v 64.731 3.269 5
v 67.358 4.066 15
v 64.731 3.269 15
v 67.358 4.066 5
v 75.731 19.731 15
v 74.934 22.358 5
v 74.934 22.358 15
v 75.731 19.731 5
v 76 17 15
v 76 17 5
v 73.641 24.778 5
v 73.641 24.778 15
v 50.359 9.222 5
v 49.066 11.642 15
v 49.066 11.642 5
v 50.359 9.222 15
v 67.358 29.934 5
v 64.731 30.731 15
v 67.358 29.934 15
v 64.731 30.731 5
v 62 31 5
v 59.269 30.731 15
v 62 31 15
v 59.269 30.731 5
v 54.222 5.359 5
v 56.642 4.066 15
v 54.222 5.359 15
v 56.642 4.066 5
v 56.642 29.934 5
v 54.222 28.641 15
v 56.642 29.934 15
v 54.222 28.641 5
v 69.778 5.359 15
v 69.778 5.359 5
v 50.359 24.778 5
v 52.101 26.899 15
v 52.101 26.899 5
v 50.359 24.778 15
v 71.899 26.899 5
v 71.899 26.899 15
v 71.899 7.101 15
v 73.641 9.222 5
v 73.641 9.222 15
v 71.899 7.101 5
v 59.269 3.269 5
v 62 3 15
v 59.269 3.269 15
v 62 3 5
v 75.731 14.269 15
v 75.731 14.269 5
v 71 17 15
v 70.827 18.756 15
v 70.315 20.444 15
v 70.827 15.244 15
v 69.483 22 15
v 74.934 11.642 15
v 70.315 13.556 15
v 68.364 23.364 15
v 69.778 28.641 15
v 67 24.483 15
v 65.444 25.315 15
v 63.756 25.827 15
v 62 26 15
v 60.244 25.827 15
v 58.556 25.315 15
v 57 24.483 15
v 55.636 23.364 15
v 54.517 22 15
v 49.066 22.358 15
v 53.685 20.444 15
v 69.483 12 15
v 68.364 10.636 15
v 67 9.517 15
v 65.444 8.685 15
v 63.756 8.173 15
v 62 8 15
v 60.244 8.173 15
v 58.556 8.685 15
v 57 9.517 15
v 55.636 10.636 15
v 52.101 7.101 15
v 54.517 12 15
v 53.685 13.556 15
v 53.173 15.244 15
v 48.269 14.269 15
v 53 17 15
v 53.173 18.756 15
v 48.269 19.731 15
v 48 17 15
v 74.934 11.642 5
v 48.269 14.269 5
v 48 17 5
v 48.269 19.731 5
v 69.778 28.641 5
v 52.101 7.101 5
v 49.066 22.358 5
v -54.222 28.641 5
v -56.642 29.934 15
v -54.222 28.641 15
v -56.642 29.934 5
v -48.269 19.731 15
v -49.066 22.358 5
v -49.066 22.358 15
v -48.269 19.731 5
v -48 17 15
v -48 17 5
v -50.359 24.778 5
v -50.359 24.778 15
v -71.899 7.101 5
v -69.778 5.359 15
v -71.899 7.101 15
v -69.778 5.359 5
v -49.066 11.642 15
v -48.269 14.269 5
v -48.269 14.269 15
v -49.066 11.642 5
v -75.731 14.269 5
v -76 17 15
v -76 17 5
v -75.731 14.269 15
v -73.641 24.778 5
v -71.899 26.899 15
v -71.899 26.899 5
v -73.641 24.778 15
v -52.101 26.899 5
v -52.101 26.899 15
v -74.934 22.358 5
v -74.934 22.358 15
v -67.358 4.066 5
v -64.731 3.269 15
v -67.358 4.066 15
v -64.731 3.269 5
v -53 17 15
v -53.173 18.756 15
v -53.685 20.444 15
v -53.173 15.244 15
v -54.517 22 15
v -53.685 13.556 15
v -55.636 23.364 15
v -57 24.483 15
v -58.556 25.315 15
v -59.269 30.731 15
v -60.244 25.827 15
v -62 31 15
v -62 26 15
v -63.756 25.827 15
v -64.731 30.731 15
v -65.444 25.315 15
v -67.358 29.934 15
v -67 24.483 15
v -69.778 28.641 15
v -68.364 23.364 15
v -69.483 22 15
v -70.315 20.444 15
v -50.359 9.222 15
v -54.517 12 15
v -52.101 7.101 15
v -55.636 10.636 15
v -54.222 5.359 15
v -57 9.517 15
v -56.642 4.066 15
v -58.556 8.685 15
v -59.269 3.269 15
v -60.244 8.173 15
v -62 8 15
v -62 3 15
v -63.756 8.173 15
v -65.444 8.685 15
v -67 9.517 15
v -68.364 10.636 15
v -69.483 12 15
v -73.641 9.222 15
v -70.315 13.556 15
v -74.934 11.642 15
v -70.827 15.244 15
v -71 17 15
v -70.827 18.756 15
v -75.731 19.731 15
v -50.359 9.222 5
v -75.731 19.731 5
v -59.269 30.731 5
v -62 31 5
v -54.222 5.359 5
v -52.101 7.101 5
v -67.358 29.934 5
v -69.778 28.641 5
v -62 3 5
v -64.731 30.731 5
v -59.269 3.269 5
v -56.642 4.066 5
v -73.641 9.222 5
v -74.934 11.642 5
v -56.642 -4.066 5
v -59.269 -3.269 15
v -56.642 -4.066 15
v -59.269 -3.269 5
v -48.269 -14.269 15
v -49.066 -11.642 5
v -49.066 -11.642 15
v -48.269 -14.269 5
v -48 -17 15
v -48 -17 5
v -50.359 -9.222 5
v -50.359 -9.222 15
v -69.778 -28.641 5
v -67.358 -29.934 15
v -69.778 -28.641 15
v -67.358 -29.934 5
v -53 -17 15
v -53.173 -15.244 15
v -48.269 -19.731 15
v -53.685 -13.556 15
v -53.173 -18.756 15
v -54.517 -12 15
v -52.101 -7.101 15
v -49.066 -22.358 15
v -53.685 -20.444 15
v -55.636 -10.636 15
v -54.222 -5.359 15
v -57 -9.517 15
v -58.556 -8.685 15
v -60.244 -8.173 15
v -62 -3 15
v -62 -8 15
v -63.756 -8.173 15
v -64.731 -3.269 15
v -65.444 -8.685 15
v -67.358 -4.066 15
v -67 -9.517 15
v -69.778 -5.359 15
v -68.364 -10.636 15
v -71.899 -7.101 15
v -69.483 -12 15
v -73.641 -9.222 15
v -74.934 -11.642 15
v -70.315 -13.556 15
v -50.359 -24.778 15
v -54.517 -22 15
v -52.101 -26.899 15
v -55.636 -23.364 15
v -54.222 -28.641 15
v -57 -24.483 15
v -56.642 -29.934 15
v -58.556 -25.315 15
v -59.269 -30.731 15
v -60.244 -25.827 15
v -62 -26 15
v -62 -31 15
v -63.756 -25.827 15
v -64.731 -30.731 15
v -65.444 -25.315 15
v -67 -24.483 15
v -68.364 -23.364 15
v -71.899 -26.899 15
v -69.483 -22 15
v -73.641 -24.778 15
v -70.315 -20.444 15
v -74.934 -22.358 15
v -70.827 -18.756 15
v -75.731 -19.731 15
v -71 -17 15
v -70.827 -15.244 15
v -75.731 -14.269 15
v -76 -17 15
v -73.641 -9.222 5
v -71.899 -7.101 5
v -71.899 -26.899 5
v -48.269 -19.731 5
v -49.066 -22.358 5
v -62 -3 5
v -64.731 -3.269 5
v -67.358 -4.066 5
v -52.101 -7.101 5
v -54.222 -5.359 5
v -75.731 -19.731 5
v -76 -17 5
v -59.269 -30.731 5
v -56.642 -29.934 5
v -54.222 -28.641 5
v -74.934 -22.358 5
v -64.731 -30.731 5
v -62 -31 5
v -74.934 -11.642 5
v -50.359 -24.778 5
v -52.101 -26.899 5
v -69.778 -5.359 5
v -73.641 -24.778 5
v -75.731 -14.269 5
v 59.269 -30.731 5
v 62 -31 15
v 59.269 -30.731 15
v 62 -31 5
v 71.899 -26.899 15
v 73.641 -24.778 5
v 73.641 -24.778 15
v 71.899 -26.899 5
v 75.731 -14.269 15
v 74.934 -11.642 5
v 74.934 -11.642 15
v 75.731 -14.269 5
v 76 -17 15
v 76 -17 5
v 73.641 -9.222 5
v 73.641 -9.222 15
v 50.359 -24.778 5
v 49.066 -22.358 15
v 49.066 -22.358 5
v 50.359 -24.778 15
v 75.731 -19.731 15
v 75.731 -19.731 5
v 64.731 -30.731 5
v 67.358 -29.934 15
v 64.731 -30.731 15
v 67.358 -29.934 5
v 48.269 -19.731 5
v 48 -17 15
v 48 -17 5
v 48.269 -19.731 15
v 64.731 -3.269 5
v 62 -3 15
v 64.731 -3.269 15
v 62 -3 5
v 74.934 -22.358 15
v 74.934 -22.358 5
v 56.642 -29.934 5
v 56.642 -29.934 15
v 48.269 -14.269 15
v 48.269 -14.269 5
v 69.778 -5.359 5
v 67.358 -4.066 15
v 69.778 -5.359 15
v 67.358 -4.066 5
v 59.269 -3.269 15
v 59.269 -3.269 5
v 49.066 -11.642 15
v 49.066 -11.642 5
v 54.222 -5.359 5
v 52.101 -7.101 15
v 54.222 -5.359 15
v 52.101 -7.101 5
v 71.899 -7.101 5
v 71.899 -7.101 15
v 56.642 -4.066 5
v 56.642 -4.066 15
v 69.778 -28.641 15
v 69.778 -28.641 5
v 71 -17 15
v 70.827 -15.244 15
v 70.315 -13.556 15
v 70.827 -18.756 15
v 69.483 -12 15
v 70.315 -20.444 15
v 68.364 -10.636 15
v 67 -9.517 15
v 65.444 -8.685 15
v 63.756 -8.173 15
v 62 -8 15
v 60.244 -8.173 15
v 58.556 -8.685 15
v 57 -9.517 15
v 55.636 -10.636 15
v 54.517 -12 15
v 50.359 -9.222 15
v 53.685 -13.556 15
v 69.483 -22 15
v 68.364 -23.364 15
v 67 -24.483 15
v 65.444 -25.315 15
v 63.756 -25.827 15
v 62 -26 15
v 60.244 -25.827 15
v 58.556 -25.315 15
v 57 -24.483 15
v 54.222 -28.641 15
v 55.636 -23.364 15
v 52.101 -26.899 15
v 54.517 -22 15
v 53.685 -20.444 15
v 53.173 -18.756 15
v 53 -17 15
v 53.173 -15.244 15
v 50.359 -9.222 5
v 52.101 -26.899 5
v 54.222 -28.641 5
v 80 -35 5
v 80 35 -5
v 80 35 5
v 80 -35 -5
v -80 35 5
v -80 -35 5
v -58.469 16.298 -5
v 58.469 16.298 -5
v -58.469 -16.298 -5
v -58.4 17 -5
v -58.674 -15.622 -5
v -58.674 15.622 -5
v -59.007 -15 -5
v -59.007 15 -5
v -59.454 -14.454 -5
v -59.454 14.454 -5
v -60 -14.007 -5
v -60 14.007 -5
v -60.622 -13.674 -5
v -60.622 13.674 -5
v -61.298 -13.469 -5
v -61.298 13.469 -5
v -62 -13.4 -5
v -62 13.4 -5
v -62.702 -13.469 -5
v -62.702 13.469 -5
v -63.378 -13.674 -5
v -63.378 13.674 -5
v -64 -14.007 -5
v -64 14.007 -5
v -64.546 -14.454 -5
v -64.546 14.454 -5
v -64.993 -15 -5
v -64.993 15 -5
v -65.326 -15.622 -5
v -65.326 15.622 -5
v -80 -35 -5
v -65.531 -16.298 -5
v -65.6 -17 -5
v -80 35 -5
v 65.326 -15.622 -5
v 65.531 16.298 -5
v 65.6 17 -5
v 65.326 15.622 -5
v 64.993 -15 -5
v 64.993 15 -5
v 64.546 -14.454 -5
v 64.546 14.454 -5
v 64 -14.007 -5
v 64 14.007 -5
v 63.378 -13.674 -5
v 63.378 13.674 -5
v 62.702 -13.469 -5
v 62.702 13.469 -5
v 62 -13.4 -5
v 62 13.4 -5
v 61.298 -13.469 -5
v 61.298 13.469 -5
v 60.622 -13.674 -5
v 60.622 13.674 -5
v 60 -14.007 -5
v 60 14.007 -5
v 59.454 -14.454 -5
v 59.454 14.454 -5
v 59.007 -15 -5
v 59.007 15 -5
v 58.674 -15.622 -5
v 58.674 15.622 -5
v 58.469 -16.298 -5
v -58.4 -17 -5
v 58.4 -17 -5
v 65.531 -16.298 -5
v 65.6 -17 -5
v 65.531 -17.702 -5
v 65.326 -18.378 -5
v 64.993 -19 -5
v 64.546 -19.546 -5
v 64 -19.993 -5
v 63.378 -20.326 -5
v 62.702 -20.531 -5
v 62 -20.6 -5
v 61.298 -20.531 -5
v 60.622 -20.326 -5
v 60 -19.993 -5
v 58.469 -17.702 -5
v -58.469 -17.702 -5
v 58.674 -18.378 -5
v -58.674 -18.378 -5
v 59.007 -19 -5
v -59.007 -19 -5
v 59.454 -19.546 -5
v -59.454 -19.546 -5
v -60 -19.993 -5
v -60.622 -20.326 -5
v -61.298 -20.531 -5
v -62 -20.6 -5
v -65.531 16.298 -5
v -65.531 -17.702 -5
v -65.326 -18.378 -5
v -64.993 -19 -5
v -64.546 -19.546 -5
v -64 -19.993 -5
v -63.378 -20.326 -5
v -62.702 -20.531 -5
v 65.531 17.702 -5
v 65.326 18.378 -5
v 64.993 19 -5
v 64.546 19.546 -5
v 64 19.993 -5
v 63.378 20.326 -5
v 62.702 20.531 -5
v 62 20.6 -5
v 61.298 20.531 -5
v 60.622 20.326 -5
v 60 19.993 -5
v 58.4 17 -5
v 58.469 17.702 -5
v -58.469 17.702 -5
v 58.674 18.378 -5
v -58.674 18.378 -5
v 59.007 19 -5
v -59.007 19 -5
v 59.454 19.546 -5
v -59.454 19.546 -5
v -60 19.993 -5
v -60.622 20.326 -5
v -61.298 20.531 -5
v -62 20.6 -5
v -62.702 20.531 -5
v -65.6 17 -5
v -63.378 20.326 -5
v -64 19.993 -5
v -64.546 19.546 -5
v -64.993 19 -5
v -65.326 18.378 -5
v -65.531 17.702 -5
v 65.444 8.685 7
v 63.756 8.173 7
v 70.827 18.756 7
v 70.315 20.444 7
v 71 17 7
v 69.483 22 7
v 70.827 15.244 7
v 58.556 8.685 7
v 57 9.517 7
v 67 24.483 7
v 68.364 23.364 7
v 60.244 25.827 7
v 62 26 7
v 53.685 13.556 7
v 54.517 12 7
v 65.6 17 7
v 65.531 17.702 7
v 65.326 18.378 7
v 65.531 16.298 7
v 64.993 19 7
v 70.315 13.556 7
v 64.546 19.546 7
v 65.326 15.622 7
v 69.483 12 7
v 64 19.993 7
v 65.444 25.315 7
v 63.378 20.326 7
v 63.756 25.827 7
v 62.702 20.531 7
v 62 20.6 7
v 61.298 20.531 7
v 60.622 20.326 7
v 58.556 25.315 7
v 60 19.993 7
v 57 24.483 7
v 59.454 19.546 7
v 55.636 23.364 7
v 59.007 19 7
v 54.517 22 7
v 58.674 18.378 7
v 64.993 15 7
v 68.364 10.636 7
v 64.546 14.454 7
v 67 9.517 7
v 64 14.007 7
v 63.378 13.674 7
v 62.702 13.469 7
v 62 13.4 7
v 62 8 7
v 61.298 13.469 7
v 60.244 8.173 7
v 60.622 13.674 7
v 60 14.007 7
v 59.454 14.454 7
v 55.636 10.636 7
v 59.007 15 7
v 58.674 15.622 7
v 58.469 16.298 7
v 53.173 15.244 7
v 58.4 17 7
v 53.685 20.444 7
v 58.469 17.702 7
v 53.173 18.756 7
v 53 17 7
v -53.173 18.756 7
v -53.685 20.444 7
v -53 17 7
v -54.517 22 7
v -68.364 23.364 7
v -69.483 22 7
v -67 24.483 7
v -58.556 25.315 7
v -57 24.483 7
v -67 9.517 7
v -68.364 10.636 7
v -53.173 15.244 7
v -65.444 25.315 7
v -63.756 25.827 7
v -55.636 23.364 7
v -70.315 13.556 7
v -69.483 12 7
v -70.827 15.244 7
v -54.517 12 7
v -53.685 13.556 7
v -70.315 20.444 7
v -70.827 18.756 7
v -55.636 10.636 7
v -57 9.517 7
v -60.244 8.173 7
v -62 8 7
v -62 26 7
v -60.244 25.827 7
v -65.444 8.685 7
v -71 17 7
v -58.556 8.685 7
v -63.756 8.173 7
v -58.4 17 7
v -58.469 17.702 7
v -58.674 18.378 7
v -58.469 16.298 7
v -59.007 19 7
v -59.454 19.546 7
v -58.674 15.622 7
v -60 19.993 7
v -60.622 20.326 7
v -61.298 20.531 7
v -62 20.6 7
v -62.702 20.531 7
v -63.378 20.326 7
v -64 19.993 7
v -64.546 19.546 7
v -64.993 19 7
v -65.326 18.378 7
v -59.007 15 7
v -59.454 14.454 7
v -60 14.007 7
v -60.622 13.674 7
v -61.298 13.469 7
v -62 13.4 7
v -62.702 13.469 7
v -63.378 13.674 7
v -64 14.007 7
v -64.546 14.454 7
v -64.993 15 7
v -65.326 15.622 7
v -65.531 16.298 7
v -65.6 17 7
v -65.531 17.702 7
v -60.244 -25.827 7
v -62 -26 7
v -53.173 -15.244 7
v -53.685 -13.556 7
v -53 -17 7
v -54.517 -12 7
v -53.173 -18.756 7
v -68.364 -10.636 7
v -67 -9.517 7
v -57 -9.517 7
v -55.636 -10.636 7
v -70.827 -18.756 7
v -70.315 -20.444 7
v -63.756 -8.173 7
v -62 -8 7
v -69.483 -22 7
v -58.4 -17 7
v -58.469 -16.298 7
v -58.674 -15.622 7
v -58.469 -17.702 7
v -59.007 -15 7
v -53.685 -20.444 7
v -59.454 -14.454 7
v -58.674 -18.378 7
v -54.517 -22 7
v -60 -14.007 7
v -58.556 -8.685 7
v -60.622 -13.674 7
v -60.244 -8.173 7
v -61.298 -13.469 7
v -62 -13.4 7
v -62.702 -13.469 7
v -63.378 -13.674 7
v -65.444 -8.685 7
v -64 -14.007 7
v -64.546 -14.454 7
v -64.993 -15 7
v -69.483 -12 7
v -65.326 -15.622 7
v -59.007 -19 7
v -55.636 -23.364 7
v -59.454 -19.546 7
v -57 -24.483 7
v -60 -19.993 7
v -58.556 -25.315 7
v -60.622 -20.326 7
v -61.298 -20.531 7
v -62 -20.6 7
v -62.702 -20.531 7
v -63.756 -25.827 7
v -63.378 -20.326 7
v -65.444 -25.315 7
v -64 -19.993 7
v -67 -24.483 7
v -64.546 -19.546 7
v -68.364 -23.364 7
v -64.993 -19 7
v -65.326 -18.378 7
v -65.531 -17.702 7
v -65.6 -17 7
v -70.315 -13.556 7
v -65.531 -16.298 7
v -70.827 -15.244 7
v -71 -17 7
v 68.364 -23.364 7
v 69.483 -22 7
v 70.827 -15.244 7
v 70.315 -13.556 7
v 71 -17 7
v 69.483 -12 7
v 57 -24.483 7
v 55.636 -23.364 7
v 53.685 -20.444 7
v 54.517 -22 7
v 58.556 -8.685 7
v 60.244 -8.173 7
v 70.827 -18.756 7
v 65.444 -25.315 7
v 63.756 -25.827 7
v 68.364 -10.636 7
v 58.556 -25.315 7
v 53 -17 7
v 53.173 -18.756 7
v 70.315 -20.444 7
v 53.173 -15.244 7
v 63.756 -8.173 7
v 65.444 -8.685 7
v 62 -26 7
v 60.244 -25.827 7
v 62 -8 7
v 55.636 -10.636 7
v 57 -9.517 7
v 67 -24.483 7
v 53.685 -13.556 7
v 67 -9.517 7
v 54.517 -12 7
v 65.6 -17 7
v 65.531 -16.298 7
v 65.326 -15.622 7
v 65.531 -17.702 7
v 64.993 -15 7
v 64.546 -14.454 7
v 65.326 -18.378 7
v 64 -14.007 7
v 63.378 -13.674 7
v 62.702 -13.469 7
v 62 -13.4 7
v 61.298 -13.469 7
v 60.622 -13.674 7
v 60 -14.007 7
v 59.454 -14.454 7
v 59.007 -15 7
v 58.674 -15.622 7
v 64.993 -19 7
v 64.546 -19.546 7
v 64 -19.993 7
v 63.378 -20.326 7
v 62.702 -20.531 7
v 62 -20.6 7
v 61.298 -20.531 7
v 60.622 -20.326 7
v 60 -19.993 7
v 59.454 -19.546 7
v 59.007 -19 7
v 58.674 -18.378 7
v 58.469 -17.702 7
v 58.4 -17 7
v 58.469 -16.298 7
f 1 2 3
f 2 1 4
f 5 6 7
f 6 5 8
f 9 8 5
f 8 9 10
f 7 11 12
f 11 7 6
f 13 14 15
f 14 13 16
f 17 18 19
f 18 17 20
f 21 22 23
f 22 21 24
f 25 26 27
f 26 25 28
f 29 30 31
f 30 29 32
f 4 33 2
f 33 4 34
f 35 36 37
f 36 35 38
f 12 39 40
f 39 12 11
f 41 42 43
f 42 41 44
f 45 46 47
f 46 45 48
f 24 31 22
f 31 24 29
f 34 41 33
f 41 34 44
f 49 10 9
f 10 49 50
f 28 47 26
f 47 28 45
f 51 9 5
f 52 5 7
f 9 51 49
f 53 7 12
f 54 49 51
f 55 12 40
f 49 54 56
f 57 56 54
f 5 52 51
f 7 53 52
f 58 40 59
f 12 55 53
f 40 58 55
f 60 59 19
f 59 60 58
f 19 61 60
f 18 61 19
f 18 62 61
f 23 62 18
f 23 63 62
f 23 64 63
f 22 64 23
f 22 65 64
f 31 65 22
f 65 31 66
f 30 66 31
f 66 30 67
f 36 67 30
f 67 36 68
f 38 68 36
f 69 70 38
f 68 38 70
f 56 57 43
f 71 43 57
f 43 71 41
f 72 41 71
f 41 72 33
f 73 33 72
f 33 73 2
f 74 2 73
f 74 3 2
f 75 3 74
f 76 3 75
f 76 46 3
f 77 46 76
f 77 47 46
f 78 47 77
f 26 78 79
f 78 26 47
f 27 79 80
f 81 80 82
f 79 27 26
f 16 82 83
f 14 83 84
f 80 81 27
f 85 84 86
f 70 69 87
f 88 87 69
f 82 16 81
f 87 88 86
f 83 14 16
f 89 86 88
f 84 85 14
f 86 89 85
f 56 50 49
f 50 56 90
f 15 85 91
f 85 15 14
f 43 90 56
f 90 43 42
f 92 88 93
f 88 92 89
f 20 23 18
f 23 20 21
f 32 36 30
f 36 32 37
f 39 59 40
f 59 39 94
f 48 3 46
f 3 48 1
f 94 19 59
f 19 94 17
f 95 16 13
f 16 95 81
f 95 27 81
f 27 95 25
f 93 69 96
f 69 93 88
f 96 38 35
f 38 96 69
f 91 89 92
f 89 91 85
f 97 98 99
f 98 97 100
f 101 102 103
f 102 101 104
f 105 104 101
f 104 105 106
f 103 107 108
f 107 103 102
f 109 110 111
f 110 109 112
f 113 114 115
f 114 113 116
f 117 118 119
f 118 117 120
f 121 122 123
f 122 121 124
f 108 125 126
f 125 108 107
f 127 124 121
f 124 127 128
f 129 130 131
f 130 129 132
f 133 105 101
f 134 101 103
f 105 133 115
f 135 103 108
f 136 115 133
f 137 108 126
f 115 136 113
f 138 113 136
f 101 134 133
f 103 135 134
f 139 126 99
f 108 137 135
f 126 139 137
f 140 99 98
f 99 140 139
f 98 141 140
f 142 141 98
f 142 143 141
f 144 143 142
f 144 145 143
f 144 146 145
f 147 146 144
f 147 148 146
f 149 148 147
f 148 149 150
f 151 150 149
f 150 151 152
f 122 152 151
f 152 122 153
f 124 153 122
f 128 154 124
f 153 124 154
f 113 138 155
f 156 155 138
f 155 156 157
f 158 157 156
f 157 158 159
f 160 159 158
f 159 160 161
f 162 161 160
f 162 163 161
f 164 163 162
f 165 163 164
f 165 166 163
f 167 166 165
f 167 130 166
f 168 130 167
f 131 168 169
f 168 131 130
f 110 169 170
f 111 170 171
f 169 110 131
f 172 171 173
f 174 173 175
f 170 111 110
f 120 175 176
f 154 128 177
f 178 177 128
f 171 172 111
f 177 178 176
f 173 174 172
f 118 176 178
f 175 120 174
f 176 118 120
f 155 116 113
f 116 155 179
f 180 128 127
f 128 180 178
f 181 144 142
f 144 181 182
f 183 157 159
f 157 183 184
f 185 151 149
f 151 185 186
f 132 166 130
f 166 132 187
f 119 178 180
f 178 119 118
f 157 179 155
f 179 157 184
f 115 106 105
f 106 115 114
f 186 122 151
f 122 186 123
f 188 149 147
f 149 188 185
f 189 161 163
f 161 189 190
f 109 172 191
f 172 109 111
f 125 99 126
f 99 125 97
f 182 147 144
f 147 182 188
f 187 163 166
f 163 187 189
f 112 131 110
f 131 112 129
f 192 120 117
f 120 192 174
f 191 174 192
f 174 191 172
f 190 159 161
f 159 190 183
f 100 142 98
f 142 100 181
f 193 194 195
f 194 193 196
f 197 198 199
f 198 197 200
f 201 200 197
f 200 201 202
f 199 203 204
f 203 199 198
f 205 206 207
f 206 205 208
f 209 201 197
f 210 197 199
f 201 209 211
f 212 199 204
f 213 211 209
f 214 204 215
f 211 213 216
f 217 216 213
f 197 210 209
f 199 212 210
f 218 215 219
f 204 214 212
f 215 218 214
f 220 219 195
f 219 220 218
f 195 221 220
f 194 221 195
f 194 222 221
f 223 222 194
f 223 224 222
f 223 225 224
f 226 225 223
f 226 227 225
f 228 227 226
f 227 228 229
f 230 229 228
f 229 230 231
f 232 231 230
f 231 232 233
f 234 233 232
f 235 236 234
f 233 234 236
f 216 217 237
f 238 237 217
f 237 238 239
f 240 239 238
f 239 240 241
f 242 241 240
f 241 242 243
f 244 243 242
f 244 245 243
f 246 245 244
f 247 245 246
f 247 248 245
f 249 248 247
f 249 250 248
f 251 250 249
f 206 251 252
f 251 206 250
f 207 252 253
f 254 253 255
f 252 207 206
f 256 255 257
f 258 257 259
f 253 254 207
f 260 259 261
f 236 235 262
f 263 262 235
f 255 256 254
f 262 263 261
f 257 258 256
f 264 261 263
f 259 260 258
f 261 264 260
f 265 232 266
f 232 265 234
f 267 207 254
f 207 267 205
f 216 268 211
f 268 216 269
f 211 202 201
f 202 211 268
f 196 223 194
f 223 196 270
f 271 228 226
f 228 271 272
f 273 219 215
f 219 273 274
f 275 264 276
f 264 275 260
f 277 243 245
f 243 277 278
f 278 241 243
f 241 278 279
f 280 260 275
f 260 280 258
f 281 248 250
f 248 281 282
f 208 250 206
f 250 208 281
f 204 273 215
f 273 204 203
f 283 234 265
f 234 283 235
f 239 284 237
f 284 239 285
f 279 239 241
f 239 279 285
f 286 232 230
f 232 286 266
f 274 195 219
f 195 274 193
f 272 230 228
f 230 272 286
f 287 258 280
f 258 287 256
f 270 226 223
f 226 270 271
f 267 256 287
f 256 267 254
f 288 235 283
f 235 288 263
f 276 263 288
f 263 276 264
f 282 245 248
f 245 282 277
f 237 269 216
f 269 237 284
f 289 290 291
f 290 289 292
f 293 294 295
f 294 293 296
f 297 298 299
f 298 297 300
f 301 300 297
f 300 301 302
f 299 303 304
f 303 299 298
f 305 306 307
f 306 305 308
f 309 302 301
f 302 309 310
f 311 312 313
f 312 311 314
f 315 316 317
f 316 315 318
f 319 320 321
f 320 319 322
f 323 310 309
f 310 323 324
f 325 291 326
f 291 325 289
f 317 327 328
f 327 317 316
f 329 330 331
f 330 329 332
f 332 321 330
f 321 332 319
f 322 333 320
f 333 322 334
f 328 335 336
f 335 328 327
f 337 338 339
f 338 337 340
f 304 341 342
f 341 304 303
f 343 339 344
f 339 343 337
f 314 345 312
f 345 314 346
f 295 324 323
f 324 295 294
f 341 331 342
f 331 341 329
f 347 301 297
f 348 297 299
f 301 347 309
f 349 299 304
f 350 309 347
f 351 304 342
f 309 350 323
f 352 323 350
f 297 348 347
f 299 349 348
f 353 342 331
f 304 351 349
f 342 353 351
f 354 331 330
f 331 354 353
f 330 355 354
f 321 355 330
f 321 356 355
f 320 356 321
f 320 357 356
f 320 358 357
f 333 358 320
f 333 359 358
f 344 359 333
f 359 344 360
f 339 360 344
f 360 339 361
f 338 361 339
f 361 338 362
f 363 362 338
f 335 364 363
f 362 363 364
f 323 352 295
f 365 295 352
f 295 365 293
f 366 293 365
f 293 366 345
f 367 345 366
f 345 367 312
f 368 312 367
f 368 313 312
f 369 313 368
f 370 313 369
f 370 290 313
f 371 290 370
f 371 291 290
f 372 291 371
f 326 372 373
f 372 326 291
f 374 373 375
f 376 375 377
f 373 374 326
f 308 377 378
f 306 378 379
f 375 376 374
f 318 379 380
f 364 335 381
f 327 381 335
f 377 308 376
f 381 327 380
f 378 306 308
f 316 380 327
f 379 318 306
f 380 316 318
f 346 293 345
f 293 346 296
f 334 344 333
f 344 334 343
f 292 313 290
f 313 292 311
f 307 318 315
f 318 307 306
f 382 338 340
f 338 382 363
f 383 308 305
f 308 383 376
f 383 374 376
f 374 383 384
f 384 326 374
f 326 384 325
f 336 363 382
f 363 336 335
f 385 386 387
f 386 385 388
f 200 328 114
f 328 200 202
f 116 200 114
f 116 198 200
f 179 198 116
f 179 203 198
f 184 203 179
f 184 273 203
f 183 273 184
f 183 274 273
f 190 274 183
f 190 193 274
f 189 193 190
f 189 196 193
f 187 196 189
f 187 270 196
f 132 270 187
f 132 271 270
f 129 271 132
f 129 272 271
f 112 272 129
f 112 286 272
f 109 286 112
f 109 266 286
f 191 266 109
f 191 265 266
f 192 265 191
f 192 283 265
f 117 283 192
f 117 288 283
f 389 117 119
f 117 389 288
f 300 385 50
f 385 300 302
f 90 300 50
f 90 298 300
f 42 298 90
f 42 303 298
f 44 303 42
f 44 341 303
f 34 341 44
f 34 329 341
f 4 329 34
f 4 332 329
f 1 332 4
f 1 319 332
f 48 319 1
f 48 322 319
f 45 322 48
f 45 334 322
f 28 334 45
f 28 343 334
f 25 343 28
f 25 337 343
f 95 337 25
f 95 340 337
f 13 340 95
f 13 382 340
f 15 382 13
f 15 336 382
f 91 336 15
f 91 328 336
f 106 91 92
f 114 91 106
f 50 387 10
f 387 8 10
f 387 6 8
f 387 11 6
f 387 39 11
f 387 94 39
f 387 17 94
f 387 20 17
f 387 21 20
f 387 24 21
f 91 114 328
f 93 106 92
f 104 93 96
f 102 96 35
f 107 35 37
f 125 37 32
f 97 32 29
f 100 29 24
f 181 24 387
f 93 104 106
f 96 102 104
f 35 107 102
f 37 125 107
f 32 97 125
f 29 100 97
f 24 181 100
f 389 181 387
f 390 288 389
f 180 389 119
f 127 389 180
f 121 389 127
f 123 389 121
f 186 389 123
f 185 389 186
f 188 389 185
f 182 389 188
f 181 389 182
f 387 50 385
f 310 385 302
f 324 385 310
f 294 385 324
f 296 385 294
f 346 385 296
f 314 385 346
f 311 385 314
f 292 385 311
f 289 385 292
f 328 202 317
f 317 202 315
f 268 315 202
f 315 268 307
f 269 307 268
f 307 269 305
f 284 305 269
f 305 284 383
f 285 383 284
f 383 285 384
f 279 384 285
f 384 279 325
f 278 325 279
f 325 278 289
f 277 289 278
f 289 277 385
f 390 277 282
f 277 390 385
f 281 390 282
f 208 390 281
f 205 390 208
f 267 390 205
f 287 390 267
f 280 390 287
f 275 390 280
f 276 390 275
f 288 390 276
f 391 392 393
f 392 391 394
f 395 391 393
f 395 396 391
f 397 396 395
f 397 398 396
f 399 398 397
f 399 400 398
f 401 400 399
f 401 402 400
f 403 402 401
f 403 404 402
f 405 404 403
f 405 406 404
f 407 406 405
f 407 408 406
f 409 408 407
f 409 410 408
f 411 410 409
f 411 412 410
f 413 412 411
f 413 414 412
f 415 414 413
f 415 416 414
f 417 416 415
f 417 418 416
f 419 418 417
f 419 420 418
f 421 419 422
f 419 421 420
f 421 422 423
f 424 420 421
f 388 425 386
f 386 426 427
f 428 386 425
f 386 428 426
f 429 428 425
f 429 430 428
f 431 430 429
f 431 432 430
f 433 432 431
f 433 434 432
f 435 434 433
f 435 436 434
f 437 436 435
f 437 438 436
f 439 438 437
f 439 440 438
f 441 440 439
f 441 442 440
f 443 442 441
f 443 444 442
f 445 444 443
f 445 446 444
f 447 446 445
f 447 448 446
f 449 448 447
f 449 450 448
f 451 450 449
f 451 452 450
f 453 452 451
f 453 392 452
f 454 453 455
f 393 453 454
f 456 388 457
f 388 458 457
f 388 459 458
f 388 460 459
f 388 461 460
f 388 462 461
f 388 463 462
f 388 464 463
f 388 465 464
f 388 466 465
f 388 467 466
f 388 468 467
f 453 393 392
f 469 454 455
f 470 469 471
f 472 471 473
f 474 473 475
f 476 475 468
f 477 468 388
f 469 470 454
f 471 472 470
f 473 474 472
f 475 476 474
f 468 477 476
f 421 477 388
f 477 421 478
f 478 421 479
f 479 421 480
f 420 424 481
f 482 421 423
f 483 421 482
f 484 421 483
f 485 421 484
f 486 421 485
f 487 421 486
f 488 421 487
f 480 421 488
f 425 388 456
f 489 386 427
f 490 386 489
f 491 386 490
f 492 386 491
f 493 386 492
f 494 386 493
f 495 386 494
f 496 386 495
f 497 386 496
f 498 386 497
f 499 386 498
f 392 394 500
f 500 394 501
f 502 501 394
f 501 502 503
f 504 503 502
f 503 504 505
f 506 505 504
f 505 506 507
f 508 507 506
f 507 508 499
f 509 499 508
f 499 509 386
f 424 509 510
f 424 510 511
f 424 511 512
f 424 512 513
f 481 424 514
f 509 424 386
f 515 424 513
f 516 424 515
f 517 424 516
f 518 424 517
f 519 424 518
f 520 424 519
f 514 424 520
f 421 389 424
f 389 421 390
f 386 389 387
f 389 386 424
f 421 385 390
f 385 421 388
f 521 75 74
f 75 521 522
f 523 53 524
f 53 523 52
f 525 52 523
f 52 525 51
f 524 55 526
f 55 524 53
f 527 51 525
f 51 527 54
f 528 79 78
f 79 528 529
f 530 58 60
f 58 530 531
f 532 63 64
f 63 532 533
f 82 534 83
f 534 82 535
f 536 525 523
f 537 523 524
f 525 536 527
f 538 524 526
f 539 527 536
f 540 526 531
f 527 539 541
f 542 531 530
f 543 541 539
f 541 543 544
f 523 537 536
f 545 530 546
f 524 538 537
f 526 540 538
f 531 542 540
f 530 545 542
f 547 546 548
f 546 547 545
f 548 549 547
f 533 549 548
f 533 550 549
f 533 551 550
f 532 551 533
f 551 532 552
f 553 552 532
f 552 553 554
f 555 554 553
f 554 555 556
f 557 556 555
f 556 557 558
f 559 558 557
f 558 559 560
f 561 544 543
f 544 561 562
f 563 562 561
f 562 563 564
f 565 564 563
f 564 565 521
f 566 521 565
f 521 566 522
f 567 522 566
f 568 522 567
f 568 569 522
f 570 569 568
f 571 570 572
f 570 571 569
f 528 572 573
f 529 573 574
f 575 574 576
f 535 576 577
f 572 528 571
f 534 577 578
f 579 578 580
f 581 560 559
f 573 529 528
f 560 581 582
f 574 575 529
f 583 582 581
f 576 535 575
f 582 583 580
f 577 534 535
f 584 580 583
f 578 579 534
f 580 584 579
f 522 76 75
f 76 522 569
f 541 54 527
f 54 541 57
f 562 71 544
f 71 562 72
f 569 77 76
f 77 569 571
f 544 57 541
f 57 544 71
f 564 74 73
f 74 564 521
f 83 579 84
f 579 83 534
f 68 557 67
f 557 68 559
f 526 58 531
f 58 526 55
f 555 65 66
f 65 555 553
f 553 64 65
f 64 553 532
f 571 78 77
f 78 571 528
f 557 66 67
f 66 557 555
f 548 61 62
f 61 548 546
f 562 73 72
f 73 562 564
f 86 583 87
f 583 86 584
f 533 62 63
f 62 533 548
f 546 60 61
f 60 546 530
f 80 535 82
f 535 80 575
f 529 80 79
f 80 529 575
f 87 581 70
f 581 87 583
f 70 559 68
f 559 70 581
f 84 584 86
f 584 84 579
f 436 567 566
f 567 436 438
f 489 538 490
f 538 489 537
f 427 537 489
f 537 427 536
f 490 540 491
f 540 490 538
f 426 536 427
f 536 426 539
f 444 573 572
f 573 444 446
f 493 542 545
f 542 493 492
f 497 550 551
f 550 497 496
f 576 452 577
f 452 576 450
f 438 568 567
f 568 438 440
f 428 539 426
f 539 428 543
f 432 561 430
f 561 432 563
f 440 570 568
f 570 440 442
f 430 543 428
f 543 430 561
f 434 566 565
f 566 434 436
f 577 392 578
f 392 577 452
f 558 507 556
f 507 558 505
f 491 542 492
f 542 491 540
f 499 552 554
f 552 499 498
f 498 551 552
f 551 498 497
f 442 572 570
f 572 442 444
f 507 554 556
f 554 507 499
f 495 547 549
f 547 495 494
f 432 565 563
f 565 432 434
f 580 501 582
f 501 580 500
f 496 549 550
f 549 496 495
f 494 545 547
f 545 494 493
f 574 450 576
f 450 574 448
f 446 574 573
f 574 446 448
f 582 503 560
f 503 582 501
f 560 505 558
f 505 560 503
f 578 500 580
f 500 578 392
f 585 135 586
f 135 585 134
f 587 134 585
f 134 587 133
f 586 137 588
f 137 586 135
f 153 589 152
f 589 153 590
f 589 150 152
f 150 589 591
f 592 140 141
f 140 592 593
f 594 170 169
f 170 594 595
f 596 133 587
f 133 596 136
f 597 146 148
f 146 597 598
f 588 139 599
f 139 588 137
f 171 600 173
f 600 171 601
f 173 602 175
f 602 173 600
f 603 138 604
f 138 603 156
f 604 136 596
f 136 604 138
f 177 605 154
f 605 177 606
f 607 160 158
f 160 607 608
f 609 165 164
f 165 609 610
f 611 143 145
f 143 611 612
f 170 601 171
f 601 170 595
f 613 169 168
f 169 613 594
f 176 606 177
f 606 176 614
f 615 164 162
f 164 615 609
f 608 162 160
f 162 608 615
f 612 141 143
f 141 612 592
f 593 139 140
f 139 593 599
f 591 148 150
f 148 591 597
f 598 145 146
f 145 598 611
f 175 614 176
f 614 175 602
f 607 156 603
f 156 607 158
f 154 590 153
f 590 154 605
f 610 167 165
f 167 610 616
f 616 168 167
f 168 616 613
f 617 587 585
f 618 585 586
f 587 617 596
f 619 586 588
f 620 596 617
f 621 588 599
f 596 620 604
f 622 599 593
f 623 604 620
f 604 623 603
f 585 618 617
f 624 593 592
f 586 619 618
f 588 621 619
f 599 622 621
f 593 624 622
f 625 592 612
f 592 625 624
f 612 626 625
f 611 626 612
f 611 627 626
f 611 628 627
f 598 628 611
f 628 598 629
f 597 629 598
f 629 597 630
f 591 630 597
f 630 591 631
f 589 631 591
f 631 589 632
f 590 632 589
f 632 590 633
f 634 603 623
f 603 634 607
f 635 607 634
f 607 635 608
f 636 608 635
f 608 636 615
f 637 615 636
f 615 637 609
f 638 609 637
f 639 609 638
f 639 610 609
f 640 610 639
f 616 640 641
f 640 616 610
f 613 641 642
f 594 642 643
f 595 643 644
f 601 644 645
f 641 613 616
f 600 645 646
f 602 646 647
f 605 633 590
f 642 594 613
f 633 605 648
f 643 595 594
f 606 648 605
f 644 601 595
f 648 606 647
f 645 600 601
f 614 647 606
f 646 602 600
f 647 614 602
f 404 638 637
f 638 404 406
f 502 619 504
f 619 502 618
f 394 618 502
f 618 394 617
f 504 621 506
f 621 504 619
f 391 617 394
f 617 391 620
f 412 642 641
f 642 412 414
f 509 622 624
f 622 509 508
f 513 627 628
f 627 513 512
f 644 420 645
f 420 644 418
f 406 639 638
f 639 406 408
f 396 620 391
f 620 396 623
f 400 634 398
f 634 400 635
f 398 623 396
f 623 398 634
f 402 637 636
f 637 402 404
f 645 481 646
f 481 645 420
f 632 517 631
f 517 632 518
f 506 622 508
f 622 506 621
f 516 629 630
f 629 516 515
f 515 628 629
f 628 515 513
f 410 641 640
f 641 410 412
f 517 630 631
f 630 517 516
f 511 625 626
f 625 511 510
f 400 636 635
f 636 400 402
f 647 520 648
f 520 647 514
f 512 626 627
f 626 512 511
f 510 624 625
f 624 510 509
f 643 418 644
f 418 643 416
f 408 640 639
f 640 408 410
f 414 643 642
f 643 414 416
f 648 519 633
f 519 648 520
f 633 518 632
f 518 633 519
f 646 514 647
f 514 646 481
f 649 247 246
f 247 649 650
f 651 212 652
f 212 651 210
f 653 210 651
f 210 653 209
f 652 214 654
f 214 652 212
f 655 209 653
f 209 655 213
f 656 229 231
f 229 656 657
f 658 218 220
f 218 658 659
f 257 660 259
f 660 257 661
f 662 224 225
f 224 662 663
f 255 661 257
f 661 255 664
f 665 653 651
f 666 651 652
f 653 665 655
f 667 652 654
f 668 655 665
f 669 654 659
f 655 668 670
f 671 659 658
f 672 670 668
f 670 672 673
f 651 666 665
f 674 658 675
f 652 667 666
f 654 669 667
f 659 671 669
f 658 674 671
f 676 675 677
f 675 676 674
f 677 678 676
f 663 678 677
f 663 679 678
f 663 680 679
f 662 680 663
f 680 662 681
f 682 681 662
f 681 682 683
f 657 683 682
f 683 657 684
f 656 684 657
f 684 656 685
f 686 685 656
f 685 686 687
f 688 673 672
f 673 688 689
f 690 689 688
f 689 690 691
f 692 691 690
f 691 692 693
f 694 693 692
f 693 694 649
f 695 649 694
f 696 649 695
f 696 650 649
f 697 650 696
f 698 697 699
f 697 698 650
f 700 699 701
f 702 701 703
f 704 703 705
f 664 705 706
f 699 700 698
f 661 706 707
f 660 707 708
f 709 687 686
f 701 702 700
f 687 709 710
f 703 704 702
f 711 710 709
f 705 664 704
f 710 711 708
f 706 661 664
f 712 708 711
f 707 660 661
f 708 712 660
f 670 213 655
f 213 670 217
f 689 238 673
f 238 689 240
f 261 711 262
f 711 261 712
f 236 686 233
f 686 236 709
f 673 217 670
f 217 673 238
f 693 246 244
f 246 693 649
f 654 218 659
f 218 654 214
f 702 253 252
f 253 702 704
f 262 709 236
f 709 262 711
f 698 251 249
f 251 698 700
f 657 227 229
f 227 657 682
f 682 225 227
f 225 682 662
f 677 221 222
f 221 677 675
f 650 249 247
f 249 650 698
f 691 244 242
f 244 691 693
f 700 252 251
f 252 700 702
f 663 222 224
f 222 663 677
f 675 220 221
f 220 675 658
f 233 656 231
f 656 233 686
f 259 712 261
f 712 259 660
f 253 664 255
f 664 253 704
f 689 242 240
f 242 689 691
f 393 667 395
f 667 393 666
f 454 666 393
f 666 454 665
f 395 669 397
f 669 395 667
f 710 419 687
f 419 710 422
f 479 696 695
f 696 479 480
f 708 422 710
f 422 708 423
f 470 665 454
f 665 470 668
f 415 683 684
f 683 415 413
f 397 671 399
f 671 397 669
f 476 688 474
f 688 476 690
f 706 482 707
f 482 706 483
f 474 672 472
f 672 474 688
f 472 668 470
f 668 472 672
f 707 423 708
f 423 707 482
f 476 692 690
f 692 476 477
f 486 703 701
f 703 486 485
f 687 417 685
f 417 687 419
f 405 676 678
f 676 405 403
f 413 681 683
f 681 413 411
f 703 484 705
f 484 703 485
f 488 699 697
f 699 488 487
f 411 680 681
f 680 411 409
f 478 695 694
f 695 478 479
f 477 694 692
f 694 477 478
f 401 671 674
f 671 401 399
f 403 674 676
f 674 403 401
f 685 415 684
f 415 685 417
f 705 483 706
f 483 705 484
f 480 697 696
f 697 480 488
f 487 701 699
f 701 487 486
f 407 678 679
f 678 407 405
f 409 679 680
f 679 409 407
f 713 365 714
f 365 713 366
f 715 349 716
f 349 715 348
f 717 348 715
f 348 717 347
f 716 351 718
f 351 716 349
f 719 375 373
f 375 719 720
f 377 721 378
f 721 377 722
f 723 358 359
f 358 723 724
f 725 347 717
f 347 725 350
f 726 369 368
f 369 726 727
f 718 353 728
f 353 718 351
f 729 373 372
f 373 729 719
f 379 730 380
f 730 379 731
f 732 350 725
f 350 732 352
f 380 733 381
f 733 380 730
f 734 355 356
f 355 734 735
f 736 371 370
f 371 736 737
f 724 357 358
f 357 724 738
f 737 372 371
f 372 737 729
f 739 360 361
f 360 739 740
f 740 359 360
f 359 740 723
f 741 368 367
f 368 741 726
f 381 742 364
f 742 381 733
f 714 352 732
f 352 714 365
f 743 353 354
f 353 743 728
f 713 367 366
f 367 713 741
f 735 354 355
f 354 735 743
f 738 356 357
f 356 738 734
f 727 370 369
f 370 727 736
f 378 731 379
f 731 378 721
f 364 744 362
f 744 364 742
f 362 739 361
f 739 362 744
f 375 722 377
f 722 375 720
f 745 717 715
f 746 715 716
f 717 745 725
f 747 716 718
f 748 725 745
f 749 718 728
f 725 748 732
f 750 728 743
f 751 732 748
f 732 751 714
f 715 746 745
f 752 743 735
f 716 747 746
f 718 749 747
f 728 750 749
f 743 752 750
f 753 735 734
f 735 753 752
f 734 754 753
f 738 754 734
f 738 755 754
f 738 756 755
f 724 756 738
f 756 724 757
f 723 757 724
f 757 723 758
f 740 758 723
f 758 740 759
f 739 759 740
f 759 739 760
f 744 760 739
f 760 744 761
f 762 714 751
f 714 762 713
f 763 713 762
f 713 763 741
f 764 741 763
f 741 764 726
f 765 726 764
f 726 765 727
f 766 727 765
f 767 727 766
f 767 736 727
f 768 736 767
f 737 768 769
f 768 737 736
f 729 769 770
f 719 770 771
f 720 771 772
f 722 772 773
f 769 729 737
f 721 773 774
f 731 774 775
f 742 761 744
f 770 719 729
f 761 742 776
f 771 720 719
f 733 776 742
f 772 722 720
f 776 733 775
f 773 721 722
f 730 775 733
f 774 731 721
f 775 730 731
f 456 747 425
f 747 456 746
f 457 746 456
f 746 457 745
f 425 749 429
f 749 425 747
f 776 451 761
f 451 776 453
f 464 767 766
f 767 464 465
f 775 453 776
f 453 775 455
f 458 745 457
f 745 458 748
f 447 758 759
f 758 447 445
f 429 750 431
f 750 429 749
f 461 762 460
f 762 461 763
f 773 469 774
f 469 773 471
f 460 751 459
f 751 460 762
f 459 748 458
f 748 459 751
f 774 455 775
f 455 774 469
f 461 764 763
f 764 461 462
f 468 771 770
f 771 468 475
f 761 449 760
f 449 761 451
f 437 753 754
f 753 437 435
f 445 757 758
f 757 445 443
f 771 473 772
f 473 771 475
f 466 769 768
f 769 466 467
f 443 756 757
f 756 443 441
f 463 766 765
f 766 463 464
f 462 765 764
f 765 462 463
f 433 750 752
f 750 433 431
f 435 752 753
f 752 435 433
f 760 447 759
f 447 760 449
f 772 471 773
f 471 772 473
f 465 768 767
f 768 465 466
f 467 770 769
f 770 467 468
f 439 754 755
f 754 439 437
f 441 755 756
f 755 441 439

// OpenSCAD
$fn = 32;

// ----------------------------------------------------------------------
// Socket pad plate
// bosses with counterbored sockets for the screws
// ----------------------------------------------------------------------

// --- parameters (mm) ---
base_t = 10;            // base plate thickness
boss_h = 10;            // boss height above the base plate
boss_d = 28;            // boss diameter
socket_d = 18;          // socket diameter
socket_depth = 8;       // socket depth from the boss face
bolt_d = 7.2;           // screw clearance hole through the socket floor
plate = [160, 70, 10];  // overall size (x, y, z)
edge = 18;              // boss centre offset from the plate edge
pads = 4;               // boss count, one per corner

// --- derived feature positions (mm) ---
height = base_t + boss_h;        // = 20   overall height of the part
corner_x = plate[0] / 2 - edge;  // = 62   boss centre X
corner_y = plate[1] / 2 - edge;  // = 17   boss centre Y
feature_centers = [
  [corner_x, corner_y],
  [-corner_x, corner_y],
  [-corner_x, -corner_y],
  [corner_x, -corner_y]
];   // boss centres: sockets, holes and the pads themselves are placed from here

// base plate, bosses on feature_centers, socket + through hole in each
difference() {
  union() {
    cube(plate, center = true);
    for (centre = feature_centers)
      translate([centre[0], centre[1], plate[2] / 2 - 1])
        cylinder(d = boss_d, h = boss_h + 1);
  }
  for (centre = feature_centers) {
    translate([centre[0], centre[1], plate[2] / 2 + boss_h - socket_depth])
      cylinder(d = socket_d, h = socket_depth + 1);
    translate([centre[0], centre[1], -height])
      cylinder(d = bolt_d, h = 2 * height + 2);  // through the socket floor
  }
}
